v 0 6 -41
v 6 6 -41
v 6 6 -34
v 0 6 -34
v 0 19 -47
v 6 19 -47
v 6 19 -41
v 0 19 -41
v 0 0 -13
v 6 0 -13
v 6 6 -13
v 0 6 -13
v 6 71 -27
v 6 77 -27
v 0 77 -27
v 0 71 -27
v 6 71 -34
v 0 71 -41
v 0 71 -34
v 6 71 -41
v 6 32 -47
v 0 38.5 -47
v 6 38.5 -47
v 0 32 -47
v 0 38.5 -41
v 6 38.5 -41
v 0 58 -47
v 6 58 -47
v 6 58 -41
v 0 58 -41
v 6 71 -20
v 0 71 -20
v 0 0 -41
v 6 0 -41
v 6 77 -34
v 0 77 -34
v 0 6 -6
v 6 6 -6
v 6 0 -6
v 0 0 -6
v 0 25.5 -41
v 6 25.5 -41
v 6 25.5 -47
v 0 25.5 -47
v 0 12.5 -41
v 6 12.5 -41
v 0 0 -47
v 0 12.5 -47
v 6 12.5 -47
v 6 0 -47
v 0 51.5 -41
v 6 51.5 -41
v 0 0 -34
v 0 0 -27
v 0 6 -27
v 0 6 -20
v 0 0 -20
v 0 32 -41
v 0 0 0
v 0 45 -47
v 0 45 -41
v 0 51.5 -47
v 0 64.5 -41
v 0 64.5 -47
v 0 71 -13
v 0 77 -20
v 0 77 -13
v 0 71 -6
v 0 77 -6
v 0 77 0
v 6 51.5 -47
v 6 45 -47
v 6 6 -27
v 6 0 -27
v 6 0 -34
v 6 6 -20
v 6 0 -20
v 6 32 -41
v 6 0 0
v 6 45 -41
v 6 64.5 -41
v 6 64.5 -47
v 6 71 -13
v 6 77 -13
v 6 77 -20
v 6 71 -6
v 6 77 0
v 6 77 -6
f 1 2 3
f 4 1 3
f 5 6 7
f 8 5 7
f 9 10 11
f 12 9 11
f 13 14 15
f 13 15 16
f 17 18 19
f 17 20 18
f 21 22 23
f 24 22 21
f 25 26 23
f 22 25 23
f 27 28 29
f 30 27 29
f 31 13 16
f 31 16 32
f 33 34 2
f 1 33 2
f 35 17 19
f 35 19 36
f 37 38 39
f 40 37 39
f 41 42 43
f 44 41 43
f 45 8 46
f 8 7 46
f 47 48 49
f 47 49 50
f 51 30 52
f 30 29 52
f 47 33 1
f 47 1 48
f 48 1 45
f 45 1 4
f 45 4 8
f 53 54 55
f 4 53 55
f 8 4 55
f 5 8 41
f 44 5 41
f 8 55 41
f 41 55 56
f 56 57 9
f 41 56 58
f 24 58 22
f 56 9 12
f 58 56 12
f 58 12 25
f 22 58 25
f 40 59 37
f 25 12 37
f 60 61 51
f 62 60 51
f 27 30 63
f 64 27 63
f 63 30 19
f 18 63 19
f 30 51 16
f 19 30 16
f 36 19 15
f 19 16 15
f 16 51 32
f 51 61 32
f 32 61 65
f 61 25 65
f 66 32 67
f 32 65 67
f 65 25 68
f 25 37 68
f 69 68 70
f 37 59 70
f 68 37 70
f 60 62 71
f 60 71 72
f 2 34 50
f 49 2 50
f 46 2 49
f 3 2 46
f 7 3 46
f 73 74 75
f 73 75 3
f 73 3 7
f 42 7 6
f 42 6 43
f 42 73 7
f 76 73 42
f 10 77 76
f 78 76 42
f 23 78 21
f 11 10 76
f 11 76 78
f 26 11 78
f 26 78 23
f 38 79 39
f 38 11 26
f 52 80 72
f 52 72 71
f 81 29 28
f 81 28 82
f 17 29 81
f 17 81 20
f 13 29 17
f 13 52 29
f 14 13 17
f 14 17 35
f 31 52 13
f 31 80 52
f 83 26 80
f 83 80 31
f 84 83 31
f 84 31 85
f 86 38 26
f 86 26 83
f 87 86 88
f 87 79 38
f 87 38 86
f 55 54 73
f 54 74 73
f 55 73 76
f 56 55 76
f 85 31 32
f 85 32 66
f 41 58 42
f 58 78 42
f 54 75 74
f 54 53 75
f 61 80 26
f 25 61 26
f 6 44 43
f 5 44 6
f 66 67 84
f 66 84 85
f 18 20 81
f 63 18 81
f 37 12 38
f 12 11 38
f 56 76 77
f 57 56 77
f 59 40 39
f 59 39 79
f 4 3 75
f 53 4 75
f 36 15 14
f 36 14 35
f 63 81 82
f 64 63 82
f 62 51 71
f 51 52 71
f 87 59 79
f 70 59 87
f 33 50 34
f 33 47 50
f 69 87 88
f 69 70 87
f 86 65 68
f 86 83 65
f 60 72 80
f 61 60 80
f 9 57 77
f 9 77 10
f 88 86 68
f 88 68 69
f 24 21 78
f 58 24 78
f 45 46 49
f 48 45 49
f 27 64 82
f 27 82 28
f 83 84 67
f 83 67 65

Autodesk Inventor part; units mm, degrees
ref_plane "YZ Plane" through (0, 0, 0) normal (1, 0, 0) x (0, 1, 0)
ref_plane "XZ Plane" through (0, 0, 0) normal (0, 1, 0) x (-1, 0, 0)
ref_plane "XY Plane" through (0, 0, 0) normal (0, 0, 1) x (1, 0, 0)
sketch "Sketch1" plane through (0, 0, 0) normal (1, 0, 0) x (0, 1, 0)
  line L0 (0, 0) -> (77, 0)
  line L1 (77, 0) -> (77, -47)
  line L2 (77, -47) -> (0, -47)
  line L3 (0, -47) -> (0, 0)
  dimension "d0" = 77
  dimension "d1" = 47
extrude "Extrusion1" add sketch "Sketch1" along normal blind 6
sketch "Sketch2" plane through (6, 0, 0) normal (1, 0, 0) x (0, 0, -1)
  line L0 (47, 0) -> (47, 77) projected
  line L1 (47, 77) -> (47, 71)
  line L2 (47, 71) -> (41, 71)
  line L3 (41, 71) -> (41, 64.5)
  line L4 (41, 64.5) -> (47, 64.5)
  line L5 (47, 64.5) -> (47, 71)
  point P0 (0, 0)
  dimension "d4" = 6
  dimension "d5" = 6
  dimension "d6" = 6.5
extrude "Extrusion2" cut sketch "Sketch2" against normal blind 6
pattern_linear "Rectangular Pattern1" count 5 spacing 13 along (0, -1, 0) of "Extrusion2"
sketch "Sketch3" plane through (6, 0, 0) normal (1, 0, 0) x (0, 0, -1)
  line L0 (0, 77) -> (0, 0) projected
  line L1 (0, 77) -> (6, 77)
  line L2 (47, 77) -> (0, 77) projected
  line L3 (6, 77) -> (13, 77)
  line L4 (13, 77) -> (13, 71)
  line L5 (13, 71) -> (6, 71)
  line L6 (6, 71) -> (6, 77)
  line L7 (0, 0) -> (47, 0) projected
  line L8 (0, 0) -> (6, 0)
  line L9 (6, 0) -> (13, 0)
  line L10 (13, 0) -> (13, 6)
  line L11 (13, 6) -> (6, 6)
  line L12 (6, 6) -> (6, 0)
  dimension "d12" = 6
  dimension "d13" = 7
  dimension "d14" = 6
  dimension "d15" = 6
  dimension "d16" = 7
  dimension "d17" = 6
extrude "Extrusion3" cut sketch "Sketch3" against normal blind 6
pattern_linear "Rectangular Pattern2" count 3 spacing 14 along (0, 0, -1) of "Extrusion3"
sketch "Sketch4" plane through (6, 0, 0) normal (1, 0, 0) x (0, 0, -1)
  line L0 (47, 76.8975) -> (47, 71)
  line L1 (41, 71) -> (47, 71) projected
  line L2 (47, 71) -> (47, 77) projected
  line L3 (41, 71) -> (47, 71)
  line L4 (47, 71) -> (47, 77)
  line L5 (47, 77) -> (41, 77)
  line L6 (41, 77) -> (41, 71)
  point P0 (0, 0)
extrude "Extrusion4" cut sketch "Sketch4" against normal blind 6
properties part number "g_arm_v_3"
